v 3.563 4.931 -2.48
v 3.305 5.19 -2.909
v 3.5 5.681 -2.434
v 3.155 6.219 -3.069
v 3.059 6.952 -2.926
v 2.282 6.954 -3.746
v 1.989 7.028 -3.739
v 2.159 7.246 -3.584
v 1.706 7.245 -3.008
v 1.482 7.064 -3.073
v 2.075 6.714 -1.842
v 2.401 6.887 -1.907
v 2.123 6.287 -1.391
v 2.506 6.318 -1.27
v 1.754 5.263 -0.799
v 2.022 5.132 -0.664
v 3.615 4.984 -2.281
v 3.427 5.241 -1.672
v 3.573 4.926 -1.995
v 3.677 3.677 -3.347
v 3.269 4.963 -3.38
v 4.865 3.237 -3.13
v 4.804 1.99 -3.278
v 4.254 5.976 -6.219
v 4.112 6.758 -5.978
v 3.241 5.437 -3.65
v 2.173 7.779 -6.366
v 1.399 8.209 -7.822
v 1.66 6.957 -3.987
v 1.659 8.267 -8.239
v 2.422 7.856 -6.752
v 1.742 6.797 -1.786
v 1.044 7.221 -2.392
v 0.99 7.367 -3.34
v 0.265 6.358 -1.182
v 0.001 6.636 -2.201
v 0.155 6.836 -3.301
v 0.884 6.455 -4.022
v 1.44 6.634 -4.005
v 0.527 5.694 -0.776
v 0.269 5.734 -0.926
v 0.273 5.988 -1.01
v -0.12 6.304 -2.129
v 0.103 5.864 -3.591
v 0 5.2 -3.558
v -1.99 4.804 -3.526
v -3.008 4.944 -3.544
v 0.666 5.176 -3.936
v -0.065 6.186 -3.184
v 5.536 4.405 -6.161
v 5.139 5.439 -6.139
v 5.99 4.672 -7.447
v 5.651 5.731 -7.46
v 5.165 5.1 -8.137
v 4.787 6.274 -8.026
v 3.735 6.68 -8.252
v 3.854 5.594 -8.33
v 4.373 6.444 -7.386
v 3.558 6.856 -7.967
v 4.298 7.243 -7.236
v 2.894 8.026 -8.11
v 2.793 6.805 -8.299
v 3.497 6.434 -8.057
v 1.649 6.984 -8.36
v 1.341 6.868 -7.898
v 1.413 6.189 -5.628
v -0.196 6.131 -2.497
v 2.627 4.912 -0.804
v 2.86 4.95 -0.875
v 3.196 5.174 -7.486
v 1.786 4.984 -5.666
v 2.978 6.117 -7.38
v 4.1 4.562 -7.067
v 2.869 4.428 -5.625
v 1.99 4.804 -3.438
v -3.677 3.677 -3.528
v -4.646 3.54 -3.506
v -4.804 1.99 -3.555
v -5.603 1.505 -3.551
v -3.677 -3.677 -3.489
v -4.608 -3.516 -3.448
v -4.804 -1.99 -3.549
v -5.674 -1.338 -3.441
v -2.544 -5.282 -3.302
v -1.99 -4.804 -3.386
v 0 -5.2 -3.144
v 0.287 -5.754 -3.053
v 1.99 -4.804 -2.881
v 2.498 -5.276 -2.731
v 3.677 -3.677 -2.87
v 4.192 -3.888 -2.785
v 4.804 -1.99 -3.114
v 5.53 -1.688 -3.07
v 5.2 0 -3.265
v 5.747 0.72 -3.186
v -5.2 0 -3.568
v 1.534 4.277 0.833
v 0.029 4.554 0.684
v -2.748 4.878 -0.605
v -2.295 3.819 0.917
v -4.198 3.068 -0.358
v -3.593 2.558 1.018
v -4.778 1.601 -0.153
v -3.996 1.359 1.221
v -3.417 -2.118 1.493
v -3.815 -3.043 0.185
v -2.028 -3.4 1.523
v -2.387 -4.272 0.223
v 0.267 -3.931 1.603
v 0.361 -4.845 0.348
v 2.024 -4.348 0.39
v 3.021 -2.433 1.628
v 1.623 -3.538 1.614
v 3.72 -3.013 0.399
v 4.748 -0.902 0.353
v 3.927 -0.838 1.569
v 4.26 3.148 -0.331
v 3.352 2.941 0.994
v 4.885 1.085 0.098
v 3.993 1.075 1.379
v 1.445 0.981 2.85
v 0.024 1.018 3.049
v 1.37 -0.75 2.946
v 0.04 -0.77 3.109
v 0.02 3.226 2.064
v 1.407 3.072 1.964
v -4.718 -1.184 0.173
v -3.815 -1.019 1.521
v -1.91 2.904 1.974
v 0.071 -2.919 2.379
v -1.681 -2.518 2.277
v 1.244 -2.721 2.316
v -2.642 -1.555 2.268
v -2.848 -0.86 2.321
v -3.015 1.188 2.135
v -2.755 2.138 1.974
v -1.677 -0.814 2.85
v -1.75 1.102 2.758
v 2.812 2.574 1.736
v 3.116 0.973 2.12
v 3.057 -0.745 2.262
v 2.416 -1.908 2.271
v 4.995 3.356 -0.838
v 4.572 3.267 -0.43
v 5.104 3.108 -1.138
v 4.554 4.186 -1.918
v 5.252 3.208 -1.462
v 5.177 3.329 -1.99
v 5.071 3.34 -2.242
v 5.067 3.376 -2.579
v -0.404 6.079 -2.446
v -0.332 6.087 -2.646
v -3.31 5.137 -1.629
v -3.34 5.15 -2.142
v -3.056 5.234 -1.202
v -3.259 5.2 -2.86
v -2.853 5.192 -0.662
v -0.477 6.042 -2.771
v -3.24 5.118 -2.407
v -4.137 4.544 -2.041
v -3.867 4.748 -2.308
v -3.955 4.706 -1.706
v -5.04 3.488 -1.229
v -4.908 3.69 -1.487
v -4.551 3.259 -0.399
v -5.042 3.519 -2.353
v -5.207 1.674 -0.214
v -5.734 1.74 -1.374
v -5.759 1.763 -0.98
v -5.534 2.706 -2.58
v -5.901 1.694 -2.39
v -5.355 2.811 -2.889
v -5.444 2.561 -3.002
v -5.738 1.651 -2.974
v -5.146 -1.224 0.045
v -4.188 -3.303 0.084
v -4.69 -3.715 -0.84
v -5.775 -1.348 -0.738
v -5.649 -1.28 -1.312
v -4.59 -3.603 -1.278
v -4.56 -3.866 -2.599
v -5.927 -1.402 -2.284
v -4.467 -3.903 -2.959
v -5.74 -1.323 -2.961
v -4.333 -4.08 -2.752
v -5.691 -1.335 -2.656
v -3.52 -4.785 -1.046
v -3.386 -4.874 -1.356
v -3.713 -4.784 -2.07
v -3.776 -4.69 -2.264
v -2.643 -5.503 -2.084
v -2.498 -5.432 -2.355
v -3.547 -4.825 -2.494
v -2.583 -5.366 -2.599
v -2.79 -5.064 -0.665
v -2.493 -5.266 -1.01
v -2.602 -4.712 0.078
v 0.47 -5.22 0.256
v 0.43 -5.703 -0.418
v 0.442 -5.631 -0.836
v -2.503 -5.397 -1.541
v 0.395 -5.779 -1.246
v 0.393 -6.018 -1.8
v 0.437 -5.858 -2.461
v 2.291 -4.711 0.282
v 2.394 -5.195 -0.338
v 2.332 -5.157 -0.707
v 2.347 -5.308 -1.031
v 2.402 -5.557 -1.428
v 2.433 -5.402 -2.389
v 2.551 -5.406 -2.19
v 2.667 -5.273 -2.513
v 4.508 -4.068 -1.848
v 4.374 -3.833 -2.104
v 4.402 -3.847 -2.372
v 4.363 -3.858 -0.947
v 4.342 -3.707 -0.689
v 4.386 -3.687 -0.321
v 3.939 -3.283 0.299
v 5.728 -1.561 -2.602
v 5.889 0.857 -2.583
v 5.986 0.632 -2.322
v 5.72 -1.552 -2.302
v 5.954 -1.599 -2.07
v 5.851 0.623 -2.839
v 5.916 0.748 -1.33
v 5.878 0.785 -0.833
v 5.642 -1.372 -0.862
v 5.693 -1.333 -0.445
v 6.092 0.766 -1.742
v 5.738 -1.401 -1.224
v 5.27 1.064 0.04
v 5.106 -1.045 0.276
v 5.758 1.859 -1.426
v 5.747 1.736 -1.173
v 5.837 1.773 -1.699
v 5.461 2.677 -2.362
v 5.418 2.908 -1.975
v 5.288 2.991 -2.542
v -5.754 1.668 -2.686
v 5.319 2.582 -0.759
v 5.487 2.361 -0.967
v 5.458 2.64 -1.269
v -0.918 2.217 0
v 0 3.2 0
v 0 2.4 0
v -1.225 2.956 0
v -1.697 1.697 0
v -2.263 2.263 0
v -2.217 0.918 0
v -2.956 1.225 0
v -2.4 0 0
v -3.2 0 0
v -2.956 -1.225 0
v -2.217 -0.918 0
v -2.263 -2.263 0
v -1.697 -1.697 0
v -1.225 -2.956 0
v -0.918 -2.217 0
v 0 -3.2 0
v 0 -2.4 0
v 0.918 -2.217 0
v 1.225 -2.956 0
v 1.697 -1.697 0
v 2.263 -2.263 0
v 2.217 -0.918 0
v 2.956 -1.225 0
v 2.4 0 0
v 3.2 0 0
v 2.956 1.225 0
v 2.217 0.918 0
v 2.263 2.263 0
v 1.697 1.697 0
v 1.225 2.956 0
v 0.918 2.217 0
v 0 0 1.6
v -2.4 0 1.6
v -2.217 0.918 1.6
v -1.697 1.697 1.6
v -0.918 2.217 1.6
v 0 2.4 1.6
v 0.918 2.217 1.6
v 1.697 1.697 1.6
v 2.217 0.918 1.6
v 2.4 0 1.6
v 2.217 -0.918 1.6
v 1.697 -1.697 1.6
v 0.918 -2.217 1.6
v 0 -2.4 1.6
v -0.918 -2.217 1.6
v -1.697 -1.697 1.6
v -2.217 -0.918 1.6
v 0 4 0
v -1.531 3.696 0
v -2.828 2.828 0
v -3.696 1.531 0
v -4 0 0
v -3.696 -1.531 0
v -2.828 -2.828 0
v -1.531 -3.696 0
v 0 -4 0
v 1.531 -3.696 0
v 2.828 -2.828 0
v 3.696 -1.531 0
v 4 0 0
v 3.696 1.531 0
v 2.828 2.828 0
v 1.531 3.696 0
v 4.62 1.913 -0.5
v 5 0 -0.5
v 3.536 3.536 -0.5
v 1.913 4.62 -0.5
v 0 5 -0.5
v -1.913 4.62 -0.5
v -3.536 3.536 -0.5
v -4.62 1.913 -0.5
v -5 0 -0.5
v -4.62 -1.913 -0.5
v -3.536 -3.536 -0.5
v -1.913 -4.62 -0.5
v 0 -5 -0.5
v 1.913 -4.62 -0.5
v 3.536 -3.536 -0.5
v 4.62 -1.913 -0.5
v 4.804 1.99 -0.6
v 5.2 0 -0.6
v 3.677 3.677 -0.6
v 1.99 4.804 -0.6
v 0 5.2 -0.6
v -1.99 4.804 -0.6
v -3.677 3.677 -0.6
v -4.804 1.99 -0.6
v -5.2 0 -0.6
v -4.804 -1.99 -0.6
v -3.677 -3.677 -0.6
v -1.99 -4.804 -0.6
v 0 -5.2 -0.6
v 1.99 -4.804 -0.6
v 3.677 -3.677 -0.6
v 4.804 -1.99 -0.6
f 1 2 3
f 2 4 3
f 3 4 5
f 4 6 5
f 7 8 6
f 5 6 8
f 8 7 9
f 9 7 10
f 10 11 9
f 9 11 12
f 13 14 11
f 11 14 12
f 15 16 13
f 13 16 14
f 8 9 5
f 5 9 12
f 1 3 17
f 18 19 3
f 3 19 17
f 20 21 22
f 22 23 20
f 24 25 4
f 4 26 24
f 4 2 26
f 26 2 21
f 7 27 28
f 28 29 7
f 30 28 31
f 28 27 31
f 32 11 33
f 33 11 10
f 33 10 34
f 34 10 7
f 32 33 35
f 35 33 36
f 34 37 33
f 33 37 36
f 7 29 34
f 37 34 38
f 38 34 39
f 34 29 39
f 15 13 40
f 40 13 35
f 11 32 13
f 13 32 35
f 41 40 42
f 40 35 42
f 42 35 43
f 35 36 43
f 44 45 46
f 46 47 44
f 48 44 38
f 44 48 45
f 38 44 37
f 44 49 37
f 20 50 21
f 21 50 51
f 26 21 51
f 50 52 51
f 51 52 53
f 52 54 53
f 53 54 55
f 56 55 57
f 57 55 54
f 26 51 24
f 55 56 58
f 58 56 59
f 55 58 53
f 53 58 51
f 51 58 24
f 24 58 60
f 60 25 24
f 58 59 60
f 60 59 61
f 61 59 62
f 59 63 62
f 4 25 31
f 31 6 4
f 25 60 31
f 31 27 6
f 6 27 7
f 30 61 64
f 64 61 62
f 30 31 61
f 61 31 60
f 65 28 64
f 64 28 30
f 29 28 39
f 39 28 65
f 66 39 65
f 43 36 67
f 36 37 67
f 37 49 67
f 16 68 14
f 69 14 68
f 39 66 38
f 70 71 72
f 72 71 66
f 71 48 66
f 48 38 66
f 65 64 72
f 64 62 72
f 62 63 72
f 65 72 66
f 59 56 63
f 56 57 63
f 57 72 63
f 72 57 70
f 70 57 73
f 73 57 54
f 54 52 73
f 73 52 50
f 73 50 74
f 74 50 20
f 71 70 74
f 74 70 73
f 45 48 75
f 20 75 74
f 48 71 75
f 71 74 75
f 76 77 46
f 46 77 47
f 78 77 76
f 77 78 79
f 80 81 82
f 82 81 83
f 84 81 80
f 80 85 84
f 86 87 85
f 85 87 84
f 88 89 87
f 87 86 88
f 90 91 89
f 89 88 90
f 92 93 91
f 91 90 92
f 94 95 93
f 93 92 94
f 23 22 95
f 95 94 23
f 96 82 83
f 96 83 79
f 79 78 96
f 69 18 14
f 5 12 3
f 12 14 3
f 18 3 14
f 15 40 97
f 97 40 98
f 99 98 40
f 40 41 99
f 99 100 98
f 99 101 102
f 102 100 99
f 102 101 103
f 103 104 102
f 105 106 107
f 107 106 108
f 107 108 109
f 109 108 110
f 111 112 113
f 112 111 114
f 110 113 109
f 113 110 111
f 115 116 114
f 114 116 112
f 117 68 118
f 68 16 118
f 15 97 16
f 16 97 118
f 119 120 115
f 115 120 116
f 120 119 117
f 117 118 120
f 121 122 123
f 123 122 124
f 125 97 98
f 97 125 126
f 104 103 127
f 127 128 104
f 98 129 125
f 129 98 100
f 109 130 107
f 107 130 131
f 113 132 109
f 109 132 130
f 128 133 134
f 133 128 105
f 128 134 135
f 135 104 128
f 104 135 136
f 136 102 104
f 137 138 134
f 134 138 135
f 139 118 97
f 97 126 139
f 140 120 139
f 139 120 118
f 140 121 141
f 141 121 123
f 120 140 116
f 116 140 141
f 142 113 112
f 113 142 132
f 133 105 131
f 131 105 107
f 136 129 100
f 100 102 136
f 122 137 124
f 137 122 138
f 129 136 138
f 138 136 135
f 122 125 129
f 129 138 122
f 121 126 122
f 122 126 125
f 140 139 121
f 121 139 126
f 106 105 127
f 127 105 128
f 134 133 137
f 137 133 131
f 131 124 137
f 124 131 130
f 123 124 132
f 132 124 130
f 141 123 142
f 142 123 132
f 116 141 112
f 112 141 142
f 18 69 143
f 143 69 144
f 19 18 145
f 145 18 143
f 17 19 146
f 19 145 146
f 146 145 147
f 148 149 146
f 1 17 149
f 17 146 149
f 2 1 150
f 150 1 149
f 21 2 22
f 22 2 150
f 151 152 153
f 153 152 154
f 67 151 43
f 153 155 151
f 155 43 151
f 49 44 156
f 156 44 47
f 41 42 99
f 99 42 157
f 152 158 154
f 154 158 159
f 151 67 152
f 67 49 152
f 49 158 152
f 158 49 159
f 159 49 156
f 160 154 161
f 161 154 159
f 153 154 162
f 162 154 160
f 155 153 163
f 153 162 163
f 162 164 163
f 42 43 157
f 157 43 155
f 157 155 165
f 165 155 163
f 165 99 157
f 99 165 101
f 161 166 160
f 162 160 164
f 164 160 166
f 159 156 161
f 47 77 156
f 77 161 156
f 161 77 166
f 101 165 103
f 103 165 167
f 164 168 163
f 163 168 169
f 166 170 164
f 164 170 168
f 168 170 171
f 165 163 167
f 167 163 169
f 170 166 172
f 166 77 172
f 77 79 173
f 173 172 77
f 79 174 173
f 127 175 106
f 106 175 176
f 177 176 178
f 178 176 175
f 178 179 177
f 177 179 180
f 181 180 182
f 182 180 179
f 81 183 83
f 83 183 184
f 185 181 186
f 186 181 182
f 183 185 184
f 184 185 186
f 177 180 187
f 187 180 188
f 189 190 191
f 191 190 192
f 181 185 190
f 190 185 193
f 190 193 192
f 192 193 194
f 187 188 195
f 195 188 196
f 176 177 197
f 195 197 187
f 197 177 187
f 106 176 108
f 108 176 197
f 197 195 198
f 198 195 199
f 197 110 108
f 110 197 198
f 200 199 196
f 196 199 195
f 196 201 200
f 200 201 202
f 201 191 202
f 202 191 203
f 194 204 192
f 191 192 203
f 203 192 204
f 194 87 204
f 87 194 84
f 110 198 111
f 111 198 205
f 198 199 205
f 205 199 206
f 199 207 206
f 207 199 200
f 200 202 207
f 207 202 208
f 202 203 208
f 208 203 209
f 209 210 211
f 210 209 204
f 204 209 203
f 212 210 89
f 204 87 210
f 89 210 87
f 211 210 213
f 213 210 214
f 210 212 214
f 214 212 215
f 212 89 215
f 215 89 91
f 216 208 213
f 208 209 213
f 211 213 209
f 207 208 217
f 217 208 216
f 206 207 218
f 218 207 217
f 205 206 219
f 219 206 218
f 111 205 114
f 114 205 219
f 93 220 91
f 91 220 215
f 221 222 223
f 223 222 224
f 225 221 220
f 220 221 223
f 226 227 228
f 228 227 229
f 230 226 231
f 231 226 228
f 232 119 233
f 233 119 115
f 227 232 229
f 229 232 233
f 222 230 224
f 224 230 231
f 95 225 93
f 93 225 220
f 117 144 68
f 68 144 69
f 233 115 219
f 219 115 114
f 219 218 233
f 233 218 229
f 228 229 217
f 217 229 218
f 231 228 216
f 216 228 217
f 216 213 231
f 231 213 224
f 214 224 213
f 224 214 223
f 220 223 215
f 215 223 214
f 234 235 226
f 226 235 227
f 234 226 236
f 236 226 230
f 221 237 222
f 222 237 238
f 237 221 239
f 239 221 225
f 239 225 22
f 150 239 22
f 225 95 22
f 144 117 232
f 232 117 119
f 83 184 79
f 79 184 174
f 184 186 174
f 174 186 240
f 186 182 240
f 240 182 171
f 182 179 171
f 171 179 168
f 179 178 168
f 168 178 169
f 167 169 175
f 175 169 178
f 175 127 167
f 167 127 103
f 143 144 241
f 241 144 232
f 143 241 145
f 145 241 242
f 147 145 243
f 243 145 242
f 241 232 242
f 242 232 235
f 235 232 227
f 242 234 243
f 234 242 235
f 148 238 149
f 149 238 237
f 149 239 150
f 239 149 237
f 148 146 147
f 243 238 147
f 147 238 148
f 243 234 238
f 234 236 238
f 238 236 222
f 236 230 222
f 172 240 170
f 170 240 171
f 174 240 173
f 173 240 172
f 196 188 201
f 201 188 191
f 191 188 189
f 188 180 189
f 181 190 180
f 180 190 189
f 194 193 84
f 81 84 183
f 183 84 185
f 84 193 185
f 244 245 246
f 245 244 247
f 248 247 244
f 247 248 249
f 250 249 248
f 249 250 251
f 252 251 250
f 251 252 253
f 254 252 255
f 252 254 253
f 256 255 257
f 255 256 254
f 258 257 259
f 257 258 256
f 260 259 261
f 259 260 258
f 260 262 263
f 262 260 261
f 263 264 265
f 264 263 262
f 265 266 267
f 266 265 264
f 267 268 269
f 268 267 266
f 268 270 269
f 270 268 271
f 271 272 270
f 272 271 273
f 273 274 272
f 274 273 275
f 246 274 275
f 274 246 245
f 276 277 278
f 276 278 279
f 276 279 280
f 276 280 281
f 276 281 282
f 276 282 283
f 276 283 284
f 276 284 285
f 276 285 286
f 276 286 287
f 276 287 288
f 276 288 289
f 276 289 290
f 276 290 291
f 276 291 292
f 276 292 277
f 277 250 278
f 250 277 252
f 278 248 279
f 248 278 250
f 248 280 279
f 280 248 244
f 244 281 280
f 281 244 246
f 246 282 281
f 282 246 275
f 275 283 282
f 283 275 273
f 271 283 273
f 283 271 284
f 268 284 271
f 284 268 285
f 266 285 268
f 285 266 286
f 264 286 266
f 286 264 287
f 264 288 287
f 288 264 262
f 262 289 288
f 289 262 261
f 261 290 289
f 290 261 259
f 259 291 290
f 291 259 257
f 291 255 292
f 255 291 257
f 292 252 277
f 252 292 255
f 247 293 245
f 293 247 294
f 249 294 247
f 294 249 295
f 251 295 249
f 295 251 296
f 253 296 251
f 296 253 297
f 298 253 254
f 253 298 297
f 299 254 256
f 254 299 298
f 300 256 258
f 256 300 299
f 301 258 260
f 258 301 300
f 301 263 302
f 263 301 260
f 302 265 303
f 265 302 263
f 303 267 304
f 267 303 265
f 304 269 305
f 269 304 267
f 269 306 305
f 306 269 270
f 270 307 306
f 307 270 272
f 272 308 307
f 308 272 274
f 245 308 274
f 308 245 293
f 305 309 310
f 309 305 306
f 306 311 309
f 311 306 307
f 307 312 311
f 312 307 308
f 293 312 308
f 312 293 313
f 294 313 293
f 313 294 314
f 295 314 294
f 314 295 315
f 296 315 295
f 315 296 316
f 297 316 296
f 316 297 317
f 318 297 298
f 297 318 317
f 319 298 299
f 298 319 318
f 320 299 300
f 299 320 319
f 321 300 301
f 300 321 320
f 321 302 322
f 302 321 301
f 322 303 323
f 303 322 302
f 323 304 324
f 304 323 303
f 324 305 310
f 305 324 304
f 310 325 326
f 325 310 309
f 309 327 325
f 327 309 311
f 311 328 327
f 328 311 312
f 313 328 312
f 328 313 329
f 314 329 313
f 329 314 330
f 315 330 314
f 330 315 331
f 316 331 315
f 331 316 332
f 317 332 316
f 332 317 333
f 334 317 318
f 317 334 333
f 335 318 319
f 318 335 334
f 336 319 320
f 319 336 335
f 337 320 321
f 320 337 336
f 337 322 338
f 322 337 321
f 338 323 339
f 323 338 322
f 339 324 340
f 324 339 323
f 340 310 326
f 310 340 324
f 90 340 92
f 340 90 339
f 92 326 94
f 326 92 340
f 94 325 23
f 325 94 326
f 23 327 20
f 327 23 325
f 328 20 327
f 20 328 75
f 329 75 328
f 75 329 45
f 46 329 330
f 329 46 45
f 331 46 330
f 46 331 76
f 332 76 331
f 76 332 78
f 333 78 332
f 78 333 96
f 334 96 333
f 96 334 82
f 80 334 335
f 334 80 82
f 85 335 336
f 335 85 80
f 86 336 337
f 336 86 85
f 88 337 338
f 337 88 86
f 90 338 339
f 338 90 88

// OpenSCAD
use <../lib.scad>
use <s/25973s01.scad>
use <s/25973s02.scad>
use <s/25973s03.scad>
use <s/25973s04.scad>
function ldraw_lib__25973p02() = [
// 0 Minifig Headdress Red Bald Head with Tied Bandana Pattern
// 0 Name: 25973p02.dat
// 0 Author: Lisa Winter [LisaWinter]
// 0 !LDRAW_ORG Part UPDATE 2026-07
// 0 !LICENSE Licensed under CC BY 4.0 : see CAreadme.txt
// 
// 0 BFC CERTIFY CCW
  [0,"BFC","CERTIFY"],
  [0,"BFC","CCW"],
// 
// 0 !CATEGORY Minifig Headwear
// 0 !KEYWORDS Bricklink 25973pb01, Brickowl 146343, Brickset 27991, Ninjago
// 0 !KEYWORDS Prime Empire, Rebrickable 25973pr0022, Set 71712, Sushimi
// 
// 0 !HISTORY 2026-07-30 [OrionP] Official Update 2026-07
// 
// 0 // Bandana
// 1 16 0 0 0 1 0 0 0 1 0 0 0 1 s\25973s01.dat
  [1,16,0,0,0,1,0,0,0,1,0,0,0,1, ldraw_lib__s__25973s01()],
// 
// 0 // Bald head
// 1 4 0 0 0 1 0 0 0 1 0 0 0 1 s\25973s02.dat
  [1,4,0,0,0,1,0,0,0,1,0,0,0,1, ldraw_lib__s__25973s02()],
// 
// 0 // Patternable area
// 1 16 0 0 0 1 0 0 0 1 0 0 0 1 s\25973s03.dat
  [1,16,0,0,0,1,0,0,0,1,0,0,0,1, ldraw_lib__s__25973s03()],
// 
// 0 // Inside
// 1 16 0 0 0 1 0 0 0 1 0 0 0 1 s\25973s04.dat
  [1,16,0,0,0,1,0,0,0,1,0,0,0,1, ldraw_lib__s__25973s04()],
];
module ldraw_lib__25973p02(step=0, col=false, unit=2/5, alt=false, line=0.2, solid=!$preview)
    makepoly(ldraw_lib__25973p02(), step=step, col=col, unit=unit, alt=alt, line=line, solid=solid);
ldraw_lib__25973p02(line=0.2);
